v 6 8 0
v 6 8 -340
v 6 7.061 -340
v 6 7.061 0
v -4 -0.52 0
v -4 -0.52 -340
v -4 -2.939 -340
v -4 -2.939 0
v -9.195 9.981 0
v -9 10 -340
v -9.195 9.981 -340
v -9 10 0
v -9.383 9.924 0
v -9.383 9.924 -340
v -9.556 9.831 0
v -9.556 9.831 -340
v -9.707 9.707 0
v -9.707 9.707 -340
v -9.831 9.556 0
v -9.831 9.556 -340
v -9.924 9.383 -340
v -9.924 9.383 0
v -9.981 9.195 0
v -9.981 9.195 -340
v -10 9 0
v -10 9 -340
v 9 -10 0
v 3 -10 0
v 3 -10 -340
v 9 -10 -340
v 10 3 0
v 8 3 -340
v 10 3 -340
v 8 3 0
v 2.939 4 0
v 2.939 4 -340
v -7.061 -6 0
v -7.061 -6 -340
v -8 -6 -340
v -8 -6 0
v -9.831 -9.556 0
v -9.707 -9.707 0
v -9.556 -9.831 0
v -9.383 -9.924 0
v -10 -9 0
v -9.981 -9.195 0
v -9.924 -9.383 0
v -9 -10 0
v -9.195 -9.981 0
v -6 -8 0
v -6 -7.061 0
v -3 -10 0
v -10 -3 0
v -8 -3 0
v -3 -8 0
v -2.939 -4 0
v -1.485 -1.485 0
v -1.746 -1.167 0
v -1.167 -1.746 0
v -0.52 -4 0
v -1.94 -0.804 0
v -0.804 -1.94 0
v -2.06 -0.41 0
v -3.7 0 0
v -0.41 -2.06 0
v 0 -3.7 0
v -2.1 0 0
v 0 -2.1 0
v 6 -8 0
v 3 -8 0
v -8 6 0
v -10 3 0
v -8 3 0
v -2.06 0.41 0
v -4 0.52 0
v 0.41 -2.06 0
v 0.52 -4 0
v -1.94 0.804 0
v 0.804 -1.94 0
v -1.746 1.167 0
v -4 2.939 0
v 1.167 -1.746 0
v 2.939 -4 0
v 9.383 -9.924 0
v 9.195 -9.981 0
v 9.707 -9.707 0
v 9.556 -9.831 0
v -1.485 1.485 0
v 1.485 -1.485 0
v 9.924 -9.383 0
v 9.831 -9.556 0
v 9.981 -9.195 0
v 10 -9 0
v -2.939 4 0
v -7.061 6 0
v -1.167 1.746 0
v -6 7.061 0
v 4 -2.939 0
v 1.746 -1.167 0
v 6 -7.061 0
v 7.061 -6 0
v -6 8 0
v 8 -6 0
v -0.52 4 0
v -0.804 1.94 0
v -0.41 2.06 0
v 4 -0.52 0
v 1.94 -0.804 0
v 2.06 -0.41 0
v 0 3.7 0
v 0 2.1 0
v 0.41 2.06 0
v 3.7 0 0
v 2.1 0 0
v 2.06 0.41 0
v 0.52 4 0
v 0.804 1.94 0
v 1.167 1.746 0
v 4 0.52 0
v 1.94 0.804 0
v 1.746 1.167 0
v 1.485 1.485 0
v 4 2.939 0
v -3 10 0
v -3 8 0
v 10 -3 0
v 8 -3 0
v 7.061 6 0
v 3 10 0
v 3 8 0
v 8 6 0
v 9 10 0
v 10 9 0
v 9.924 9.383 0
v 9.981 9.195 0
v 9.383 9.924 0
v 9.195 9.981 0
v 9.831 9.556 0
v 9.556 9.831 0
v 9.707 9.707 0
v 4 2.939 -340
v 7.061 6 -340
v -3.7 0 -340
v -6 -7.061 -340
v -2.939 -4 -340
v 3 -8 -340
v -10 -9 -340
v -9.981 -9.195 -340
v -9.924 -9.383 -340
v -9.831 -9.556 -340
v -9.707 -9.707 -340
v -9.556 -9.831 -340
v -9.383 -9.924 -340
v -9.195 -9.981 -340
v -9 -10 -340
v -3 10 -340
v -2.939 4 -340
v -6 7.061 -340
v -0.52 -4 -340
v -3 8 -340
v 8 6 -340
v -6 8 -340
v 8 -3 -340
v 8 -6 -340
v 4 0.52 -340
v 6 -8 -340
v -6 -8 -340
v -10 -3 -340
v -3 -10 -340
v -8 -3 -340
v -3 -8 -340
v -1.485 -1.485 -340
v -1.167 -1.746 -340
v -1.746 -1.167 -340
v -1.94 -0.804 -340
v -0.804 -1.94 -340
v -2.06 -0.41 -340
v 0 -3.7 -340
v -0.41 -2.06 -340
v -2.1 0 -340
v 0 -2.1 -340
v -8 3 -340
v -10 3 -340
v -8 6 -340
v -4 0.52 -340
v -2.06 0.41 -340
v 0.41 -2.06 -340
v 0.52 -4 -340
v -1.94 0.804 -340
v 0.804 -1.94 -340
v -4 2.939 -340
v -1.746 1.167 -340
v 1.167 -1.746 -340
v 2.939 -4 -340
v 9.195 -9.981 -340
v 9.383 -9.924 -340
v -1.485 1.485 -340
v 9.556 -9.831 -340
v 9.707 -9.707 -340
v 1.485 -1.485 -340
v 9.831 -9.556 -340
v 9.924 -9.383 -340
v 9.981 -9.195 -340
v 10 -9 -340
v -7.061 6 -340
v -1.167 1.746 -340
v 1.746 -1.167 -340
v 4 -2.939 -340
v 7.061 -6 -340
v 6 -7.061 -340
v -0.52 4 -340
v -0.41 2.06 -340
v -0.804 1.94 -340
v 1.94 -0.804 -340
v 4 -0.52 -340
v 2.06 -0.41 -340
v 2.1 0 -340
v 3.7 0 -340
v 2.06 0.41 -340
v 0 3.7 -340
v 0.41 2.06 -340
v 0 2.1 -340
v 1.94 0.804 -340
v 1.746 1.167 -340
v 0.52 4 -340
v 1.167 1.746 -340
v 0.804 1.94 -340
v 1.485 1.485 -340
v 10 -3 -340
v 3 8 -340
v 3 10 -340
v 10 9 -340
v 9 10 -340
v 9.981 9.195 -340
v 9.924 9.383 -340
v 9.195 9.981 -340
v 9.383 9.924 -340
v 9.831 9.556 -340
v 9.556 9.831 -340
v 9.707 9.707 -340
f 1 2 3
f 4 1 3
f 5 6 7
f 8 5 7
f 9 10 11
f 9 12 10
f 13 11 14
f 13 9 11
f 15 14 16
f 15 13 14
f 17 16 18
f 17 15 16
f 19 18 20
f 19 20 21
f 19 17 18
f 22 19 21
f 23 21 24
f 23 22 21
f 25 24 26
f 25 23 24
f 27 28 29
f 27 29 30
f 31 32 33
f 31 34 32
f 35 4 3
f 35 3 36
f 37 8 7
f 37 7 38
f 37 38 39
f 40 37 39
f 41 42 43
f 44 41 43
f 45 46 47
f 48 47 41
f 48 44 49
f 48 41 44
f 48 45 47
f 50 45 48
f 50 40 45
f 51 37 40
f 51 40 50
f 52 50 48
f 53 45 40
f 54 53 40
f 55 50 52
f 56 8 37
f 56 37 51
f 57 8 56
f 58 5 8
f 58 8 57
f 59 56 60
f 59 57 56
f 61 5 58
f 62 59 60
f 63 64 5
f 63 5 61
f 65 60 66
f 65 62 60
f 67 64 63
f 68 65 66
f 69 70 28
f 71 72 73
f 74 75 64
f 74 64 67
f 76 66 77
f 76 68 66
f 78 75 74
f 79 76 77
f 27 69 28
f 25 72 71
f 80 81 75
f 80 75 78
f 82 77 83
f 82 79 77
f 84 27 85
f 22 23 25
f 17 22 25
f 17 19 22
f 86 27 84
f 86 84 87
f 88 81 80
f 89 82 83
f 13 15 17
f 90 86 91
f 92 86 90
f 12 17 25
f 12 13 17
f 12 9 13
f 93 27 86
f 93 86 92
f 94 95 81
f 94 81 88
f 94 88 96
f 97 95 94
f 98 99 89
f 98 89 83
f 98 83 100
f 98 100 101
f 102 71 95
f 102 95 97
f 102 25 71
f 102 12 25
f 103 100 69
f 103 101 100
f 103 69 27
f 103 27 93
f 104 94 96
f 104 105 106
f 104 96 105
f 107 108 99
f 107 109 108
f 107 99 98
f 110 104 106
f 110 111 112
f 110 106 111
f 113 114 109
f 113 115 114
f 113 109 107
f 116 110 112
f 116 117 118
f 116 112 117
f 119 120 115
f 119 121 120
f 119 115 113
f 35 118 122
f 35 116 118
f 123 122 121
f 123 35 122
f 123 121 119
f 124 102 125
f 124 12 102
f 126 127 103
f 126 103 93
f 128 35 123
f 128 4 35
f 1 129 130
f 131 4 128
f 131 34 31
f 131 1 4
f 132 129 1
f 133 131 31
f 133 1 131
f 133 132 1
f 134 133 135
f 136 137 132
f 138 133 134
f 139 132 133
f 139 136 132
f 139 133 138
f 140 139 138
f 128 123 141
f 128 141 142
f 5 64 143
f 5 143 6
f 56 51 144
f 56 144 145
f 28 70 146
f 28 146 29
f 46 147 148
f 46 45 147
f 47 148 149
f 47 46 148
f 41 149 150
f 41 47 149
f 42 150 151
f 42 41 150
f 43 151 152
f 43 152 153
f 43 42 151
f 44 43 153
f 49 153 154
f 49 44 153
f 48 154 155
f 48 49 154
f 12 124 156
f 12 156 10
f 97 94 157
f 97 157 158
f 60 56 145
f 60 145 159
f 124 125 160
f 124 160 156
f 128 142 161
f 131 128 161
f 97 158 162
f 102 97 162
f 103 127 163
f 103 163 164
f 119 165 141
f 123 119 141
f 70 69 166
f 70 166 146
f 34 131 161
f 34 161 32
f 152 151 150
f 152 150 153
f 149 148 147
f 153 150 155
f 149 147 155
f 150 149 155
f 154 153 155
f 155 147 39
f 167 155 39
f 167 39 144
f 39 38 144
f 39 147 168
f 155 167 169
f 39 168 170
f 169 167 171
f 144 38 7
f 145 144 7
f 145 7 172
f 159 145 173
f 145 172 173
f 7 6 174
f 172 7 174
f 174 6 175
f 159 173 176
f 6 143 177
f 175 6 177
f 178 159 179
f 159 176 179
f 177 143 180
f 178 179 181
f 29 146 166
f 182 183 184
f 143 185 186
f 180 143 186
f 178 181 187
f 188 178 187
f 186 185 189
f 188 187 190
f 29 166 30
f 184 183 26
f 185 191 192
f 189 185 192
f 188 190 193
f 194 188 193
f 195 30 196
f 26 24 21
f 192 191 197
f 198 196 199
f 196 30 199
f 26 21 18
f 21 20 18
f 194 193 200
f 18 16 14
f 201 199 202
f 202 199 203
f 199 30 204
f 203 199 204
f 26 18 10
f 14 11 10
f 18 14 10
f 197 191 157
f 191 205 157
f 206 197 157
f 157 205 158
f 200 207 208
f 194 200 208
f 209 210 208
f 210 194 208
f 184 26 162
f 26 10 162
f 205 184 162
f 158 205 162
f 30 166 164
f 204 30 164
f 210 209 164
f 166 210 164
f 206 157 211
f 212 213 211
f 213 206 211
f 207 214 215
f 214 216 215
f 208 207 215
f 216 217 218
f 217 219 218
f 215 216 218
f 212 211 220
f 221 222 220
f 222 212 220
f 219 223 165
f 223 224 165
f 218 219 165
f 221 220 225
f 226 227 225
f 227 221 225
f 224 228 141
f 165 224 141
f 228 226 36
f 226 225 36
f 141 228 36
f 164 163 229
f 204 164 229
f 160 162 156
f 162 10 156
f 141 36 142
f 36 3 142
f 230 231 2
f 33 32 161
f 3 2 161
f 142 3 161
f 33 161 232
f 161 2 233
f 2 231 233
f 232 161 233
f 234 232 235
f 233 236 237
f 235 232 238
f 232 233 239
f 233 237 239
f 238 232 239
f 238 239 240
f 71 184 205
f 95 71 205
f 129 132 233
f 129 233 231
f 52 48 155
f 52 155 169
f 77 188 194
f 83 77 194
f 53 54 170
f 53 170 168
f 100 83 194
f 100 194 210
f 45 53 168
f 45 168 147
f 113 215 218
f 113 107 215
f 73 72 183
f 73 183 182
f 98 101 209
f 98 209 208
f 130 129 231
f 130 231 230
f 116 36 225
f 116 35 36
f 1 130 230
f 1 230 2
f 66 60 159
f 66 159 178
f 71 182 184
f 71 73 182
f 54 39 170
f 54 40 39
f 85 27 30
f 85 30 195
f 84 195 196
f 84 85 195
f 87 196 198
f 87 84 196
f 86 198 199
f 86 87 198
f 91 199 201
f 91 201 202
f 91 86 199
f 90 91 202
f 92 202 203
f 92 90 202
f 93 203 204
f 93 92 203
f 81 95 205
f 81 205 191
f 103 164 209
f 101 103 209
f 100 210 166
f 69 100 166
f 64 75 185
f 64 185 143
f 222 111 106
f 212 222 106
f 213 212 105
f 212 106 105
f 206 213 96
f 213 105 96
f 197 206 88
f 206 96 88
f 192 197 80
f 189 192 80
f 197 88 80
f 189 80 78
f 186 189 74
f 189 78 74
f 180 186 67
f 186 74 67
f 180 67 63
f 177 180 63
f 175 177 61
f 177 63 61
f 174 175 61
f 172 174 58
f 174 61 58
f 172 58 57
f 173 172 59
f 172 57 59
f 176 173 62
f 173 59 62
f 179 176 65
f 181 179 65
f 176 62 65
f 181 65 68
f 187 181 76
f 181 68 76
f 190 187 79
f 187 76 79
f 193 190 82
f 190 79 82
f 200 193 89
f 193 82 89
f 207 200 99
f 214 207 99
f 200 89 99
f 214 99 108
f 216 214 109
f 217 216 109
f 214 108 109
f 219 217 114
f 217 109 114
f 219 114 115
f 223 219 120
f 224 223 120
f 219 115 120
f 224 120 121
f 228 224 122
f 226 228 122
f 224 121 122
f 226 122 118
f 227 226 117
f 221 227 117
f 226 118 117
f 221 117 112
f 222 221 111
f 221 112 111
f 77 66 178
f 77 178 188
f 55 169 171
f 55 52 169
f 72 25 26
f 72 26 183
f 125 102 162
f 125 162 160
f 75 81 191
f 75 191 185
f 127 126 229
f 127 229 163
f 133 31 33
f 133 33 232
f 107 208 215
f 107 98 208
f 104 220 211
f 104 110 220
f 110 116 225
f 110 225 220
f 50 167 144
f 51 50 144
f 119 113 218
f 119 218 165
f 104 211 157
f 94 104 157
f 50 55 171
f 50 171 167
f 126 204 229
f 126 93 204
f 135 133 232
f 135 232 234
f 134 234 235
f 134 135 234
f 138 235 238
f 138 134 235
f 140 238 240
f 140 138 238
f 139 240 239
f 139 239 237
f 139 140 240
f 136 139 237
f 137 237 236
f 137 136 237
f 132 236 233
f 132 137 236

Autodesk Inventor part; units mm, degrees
sketch "Sketch_1" plane through (0, 0, 0) normal (0, 0, 1) x (1, 0, 0)
  line L0 (-10, -3) -> (-10, -9)
  arc A0 (-10, -9) -> (-9, -10) centre (-9, -9) ccw
  line L1 (-9, -10) -> (-3, -10)
  line L2 (-3, -10) -> (-3, -8)
  line L3 (-3, -8) -> (-6, -8)
  line L4 (-6, -8) -> (-6, -7.0607)
  line L5 (-6, -7.0607) -> (-2.9393, -4)
  line L6 (-2.9393, -4) -> (-0.5196, -4)
  line L7 (-0.5196, -4) -> (0, -3.7)
  line L8 (0, -3.7) -> (0.5196, -4)
  line L9 (0.5196, -4) -> (2.9393, -4)
  line L10 (2.9393, -4) -> (6, -7.0607)
  line L11 (6, -7.0607) -> (6, -8)
  line L12 (6, -8) -> (3, -8)
  line L13 (3, -8) -> (3, -10)
  line L14 (3, -10) -> (9, -10)
  arc A1 (9, -10) -> (10, -9) centre (9, -9) ccw
  line L15 (10, -9) -> (10, -3)
  line L16 (10, -3) -> (8, -3)
  line L17 (8, -3) -> (8, -6)
  line L18 (8, -6) -> (7.0607, -6)
  line L19 (7.0607, -6) -> (4, -2.9393)
  line L20 (4, -2.9393) -> (4, -0.5196)
  line L21 (4, -0.5196) -> (3.7, 0)
  line L22 (3.7, 0) -> (4, 0.5196)
  line L23 (4, 0.5196) -> (4, 2.9393)
  line L24 (4, 2.9393) -> (7.0607, 6)
  line L25 (7.0607, 6) -> (8, 6)
  line L26 (8, 6) -> (8, 3)
  line L27 (8, 3) -> (10, 3)
  line L28 (10, 3) -> (10, 9)
  arc A2 (10, 9) -> (9, 10) centre (9, 9) ccw
  line L29 (9, 10) -> (3, 10)
  line L30 (3, 10) -> (3, 8)
  line L31 (3, 8) -> (6, 8)
  line L32 (6, 8) -> (6, 7.0607)
  line L33 (6, 7.0607) -> (2.9393, 4)
  line L34 (2.9393, 4) -> (0.5196, 4)
  line L35 (0.5196, 4) -> (0, 3.7)
  line L36 (0, 3.7) -> (-0.5196, 4)
  line L37 (-0.5196, 4) -> (-2.9393, 4)
  line L38 (-2.9393, 4) -> (-6, 7.0607)
  line L39 (-6, 7.0607) -> (-6, 8)
  line L40 (-6, 8) -> (-3, 8)
  line L41 (-3, 8) -> (-3, 10)
  line L42 (-3, 10) -> (-9, 10)
  arc A3 (-9, 10) -> (-10, 9) centre (-9, 9) ccw
  line L43 (-10, 9) -> (-10, 3)
  line L44 (-10, 3) -> (-8, 3)
  line L45 (-8, 3) -> (-8, 6)
  line L46 (-8, 6) -> (-7.0607, 6)
  line L47 (-7.0607, 6) -> (-4, 2.9393)
  line L48 (-4, 2.9393) -> (-4, 0.5196)
  line L49 (-4, 0.5196) -> (-3.7, 0)
  line L50 (-3.7, 0) -> (-4, -0.5196)
  line L51 (-4, -0.5196) -> (-4, -2.9393)
  line L52 (-4, -2.9393) -> (-7.0607, -6)
  line L53 (-7.0607, -6) -> (-8, -6)
  line L54 (-8, -6) -> (-8, -3)
  line L55 (-8, -3) -> (-10, -3)
extrude "Extrusion1" add sketch "Sketch_1" against normal blind 340
sketch "Sketch2" plane through (0, 0, -340) normal (0, 0, -1) x (-1, 0, 0)
  point P0 (0, 0)
hole "Hole1" at (0, 0, -340) direction (0, 0, 1) diameter 4.2 depth 340
ref_plane "C1_XY" through (0, 0, 0) normal (0, 0, 1) x (1, 0, 0)
ref_plane "C1_YZ" through (0, 0, 0) normal (1, 0, 0) x (0, 1, 0)
ref_plane "C1_ZX" through (0, 0, 0) normal (0, 1, 0) x (0, 0, 1)
properties part number "HFS5-2020-340"
